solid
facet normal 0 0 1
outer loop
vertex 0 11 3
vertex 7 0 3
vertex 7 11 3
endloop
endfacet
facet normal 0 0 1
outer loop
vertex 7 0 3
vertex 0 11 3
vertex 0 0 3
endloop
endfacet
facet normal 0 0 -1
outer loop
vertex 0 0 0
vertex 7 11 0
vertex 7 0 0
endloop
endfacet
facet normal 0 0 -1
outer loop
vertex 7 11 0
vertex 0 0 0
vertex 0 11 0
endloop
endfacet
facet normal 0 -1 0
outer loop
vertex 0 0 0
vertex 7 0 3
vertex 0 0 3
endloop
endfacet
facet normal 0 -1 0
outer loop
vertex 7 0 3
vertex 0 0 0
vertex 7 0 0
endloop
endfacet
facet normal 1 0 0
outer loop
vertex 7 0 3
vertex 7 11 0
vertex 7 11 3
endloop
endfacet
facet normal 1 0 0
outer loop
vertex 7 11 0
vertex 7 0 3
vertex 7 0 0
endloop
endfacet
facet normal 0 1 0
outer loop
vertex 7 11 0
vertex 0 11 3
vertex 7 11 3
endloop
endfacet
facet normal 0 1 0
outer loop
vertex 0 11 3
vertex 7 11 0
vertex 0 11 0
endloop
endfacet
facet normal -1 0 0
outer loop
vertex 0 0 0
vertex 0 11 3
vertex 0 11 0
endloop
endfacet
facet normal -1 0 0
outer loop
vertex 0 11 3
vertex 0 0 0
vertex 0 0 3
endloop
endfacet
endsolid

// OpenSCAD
// Generated by SolidPython 1.0.1 on 2020-07-29 00:46:55


cube(size = [7, 11, 3]);
/***********************************************
*********      SolidPython code:      **********
************************************************
 
# import packages: SolidPython
from solid import *
from solid.utils import *
from itertools import chain, combinations, permutations


class Resize:

    def __init__(self, scad_file):
        self.scad_file = scad_file
        #self.scad_file = import_scad(scad_file)
        # cone/cylinder param:
        self.r1 = 0
        self.r2 = 0
        self.h = 0
        # rectangular prism param:
        self.w = 0
        self.l = 0
        # ellipse param:
        self.r = 0

    # import OpenScad code (file name corresponds to shape)


    # classify shape + parameters
    def assign(self, param1, param2, param3):
        if self.scad_file == 'cone.scad':
            self.r1 = param1
            self.r2 = param2
            self.h = param3
        elif self.scad_file == 'cylinder.scad':
            self.r1 = param1
            self.r2 = param2
            self.h = param3
        elif self.scad_file == 'rectangularPrism.scad':
            self.h = param1
            self.l = param2
            self.w = param3
        else:
            self.r = param1
            self.h = param2

    # resize parameters
    def iterate(self):
        x = range(3, 20, 2)
        i = 1
        if self.scad_file == 'cone.scad':
            tempList = list(permutations(x, 2))
            for temp in tempList:
                param1 = temp[0]
                param2 = temp[1]
                filepath = 'produced_scad_files/' + 'cone' + str(param1) + '_' + str(param2) + '_' + '.scad'
                scad_render_to_file(cylinder(h=param1, r1=param2, r2=0), filepath)

        elif self.scad_file == 'cylinder.scad':
            tempList = list(permutations(x, 3))
            for temp in tempList:
                param1 = temp[0]
                param2 = temp[1]
                filepath = 'produced_scad_files/' + 'cylinder' + str(param1) + '_' + str(param2) + '_' + '.scad'
                scad_render_to_file(cylinder(h=param1, r1=param2, r2=param2), filepath)

        elif self.scad_file == 'rectangularPrism.scad':
            tempList = list(permutations(x, 3))
            for temp in tempList:
                param1 = temp[0]
                param2 = temp[1]
                param3 = temp[2]
                filepath = 'produced_scad_files/' + 'rectangularPrism' + str(param1) + '_' + str(param2) + '_' + str(
                    param3) + '.scad'
                scad_render_to_file(cube(size=(param1, param2, param3)), filepath)

        elif self.scad_file == 'ellipse.scad':
            tempList = list(permutations(x, 4))
            for temp in tempList:
                param1 = temp[0]
                param2 = temp[1]
                param3 = temp[2]
                param4 = temp[3]
                filepath = 'produced_scad_files/' + 'ellipse' + str(param1) + '_' + str(param2) + '_' + str(param3) + '_' + str(param4) + '.scad'
                scad_render_to_file(scale([param1, param2, param3])(sphere(r=param4)), filepath)

    def render_to_scadfile(self):
        scad_render_to_file(scad, 'example.scad') 
 
************************************************/
